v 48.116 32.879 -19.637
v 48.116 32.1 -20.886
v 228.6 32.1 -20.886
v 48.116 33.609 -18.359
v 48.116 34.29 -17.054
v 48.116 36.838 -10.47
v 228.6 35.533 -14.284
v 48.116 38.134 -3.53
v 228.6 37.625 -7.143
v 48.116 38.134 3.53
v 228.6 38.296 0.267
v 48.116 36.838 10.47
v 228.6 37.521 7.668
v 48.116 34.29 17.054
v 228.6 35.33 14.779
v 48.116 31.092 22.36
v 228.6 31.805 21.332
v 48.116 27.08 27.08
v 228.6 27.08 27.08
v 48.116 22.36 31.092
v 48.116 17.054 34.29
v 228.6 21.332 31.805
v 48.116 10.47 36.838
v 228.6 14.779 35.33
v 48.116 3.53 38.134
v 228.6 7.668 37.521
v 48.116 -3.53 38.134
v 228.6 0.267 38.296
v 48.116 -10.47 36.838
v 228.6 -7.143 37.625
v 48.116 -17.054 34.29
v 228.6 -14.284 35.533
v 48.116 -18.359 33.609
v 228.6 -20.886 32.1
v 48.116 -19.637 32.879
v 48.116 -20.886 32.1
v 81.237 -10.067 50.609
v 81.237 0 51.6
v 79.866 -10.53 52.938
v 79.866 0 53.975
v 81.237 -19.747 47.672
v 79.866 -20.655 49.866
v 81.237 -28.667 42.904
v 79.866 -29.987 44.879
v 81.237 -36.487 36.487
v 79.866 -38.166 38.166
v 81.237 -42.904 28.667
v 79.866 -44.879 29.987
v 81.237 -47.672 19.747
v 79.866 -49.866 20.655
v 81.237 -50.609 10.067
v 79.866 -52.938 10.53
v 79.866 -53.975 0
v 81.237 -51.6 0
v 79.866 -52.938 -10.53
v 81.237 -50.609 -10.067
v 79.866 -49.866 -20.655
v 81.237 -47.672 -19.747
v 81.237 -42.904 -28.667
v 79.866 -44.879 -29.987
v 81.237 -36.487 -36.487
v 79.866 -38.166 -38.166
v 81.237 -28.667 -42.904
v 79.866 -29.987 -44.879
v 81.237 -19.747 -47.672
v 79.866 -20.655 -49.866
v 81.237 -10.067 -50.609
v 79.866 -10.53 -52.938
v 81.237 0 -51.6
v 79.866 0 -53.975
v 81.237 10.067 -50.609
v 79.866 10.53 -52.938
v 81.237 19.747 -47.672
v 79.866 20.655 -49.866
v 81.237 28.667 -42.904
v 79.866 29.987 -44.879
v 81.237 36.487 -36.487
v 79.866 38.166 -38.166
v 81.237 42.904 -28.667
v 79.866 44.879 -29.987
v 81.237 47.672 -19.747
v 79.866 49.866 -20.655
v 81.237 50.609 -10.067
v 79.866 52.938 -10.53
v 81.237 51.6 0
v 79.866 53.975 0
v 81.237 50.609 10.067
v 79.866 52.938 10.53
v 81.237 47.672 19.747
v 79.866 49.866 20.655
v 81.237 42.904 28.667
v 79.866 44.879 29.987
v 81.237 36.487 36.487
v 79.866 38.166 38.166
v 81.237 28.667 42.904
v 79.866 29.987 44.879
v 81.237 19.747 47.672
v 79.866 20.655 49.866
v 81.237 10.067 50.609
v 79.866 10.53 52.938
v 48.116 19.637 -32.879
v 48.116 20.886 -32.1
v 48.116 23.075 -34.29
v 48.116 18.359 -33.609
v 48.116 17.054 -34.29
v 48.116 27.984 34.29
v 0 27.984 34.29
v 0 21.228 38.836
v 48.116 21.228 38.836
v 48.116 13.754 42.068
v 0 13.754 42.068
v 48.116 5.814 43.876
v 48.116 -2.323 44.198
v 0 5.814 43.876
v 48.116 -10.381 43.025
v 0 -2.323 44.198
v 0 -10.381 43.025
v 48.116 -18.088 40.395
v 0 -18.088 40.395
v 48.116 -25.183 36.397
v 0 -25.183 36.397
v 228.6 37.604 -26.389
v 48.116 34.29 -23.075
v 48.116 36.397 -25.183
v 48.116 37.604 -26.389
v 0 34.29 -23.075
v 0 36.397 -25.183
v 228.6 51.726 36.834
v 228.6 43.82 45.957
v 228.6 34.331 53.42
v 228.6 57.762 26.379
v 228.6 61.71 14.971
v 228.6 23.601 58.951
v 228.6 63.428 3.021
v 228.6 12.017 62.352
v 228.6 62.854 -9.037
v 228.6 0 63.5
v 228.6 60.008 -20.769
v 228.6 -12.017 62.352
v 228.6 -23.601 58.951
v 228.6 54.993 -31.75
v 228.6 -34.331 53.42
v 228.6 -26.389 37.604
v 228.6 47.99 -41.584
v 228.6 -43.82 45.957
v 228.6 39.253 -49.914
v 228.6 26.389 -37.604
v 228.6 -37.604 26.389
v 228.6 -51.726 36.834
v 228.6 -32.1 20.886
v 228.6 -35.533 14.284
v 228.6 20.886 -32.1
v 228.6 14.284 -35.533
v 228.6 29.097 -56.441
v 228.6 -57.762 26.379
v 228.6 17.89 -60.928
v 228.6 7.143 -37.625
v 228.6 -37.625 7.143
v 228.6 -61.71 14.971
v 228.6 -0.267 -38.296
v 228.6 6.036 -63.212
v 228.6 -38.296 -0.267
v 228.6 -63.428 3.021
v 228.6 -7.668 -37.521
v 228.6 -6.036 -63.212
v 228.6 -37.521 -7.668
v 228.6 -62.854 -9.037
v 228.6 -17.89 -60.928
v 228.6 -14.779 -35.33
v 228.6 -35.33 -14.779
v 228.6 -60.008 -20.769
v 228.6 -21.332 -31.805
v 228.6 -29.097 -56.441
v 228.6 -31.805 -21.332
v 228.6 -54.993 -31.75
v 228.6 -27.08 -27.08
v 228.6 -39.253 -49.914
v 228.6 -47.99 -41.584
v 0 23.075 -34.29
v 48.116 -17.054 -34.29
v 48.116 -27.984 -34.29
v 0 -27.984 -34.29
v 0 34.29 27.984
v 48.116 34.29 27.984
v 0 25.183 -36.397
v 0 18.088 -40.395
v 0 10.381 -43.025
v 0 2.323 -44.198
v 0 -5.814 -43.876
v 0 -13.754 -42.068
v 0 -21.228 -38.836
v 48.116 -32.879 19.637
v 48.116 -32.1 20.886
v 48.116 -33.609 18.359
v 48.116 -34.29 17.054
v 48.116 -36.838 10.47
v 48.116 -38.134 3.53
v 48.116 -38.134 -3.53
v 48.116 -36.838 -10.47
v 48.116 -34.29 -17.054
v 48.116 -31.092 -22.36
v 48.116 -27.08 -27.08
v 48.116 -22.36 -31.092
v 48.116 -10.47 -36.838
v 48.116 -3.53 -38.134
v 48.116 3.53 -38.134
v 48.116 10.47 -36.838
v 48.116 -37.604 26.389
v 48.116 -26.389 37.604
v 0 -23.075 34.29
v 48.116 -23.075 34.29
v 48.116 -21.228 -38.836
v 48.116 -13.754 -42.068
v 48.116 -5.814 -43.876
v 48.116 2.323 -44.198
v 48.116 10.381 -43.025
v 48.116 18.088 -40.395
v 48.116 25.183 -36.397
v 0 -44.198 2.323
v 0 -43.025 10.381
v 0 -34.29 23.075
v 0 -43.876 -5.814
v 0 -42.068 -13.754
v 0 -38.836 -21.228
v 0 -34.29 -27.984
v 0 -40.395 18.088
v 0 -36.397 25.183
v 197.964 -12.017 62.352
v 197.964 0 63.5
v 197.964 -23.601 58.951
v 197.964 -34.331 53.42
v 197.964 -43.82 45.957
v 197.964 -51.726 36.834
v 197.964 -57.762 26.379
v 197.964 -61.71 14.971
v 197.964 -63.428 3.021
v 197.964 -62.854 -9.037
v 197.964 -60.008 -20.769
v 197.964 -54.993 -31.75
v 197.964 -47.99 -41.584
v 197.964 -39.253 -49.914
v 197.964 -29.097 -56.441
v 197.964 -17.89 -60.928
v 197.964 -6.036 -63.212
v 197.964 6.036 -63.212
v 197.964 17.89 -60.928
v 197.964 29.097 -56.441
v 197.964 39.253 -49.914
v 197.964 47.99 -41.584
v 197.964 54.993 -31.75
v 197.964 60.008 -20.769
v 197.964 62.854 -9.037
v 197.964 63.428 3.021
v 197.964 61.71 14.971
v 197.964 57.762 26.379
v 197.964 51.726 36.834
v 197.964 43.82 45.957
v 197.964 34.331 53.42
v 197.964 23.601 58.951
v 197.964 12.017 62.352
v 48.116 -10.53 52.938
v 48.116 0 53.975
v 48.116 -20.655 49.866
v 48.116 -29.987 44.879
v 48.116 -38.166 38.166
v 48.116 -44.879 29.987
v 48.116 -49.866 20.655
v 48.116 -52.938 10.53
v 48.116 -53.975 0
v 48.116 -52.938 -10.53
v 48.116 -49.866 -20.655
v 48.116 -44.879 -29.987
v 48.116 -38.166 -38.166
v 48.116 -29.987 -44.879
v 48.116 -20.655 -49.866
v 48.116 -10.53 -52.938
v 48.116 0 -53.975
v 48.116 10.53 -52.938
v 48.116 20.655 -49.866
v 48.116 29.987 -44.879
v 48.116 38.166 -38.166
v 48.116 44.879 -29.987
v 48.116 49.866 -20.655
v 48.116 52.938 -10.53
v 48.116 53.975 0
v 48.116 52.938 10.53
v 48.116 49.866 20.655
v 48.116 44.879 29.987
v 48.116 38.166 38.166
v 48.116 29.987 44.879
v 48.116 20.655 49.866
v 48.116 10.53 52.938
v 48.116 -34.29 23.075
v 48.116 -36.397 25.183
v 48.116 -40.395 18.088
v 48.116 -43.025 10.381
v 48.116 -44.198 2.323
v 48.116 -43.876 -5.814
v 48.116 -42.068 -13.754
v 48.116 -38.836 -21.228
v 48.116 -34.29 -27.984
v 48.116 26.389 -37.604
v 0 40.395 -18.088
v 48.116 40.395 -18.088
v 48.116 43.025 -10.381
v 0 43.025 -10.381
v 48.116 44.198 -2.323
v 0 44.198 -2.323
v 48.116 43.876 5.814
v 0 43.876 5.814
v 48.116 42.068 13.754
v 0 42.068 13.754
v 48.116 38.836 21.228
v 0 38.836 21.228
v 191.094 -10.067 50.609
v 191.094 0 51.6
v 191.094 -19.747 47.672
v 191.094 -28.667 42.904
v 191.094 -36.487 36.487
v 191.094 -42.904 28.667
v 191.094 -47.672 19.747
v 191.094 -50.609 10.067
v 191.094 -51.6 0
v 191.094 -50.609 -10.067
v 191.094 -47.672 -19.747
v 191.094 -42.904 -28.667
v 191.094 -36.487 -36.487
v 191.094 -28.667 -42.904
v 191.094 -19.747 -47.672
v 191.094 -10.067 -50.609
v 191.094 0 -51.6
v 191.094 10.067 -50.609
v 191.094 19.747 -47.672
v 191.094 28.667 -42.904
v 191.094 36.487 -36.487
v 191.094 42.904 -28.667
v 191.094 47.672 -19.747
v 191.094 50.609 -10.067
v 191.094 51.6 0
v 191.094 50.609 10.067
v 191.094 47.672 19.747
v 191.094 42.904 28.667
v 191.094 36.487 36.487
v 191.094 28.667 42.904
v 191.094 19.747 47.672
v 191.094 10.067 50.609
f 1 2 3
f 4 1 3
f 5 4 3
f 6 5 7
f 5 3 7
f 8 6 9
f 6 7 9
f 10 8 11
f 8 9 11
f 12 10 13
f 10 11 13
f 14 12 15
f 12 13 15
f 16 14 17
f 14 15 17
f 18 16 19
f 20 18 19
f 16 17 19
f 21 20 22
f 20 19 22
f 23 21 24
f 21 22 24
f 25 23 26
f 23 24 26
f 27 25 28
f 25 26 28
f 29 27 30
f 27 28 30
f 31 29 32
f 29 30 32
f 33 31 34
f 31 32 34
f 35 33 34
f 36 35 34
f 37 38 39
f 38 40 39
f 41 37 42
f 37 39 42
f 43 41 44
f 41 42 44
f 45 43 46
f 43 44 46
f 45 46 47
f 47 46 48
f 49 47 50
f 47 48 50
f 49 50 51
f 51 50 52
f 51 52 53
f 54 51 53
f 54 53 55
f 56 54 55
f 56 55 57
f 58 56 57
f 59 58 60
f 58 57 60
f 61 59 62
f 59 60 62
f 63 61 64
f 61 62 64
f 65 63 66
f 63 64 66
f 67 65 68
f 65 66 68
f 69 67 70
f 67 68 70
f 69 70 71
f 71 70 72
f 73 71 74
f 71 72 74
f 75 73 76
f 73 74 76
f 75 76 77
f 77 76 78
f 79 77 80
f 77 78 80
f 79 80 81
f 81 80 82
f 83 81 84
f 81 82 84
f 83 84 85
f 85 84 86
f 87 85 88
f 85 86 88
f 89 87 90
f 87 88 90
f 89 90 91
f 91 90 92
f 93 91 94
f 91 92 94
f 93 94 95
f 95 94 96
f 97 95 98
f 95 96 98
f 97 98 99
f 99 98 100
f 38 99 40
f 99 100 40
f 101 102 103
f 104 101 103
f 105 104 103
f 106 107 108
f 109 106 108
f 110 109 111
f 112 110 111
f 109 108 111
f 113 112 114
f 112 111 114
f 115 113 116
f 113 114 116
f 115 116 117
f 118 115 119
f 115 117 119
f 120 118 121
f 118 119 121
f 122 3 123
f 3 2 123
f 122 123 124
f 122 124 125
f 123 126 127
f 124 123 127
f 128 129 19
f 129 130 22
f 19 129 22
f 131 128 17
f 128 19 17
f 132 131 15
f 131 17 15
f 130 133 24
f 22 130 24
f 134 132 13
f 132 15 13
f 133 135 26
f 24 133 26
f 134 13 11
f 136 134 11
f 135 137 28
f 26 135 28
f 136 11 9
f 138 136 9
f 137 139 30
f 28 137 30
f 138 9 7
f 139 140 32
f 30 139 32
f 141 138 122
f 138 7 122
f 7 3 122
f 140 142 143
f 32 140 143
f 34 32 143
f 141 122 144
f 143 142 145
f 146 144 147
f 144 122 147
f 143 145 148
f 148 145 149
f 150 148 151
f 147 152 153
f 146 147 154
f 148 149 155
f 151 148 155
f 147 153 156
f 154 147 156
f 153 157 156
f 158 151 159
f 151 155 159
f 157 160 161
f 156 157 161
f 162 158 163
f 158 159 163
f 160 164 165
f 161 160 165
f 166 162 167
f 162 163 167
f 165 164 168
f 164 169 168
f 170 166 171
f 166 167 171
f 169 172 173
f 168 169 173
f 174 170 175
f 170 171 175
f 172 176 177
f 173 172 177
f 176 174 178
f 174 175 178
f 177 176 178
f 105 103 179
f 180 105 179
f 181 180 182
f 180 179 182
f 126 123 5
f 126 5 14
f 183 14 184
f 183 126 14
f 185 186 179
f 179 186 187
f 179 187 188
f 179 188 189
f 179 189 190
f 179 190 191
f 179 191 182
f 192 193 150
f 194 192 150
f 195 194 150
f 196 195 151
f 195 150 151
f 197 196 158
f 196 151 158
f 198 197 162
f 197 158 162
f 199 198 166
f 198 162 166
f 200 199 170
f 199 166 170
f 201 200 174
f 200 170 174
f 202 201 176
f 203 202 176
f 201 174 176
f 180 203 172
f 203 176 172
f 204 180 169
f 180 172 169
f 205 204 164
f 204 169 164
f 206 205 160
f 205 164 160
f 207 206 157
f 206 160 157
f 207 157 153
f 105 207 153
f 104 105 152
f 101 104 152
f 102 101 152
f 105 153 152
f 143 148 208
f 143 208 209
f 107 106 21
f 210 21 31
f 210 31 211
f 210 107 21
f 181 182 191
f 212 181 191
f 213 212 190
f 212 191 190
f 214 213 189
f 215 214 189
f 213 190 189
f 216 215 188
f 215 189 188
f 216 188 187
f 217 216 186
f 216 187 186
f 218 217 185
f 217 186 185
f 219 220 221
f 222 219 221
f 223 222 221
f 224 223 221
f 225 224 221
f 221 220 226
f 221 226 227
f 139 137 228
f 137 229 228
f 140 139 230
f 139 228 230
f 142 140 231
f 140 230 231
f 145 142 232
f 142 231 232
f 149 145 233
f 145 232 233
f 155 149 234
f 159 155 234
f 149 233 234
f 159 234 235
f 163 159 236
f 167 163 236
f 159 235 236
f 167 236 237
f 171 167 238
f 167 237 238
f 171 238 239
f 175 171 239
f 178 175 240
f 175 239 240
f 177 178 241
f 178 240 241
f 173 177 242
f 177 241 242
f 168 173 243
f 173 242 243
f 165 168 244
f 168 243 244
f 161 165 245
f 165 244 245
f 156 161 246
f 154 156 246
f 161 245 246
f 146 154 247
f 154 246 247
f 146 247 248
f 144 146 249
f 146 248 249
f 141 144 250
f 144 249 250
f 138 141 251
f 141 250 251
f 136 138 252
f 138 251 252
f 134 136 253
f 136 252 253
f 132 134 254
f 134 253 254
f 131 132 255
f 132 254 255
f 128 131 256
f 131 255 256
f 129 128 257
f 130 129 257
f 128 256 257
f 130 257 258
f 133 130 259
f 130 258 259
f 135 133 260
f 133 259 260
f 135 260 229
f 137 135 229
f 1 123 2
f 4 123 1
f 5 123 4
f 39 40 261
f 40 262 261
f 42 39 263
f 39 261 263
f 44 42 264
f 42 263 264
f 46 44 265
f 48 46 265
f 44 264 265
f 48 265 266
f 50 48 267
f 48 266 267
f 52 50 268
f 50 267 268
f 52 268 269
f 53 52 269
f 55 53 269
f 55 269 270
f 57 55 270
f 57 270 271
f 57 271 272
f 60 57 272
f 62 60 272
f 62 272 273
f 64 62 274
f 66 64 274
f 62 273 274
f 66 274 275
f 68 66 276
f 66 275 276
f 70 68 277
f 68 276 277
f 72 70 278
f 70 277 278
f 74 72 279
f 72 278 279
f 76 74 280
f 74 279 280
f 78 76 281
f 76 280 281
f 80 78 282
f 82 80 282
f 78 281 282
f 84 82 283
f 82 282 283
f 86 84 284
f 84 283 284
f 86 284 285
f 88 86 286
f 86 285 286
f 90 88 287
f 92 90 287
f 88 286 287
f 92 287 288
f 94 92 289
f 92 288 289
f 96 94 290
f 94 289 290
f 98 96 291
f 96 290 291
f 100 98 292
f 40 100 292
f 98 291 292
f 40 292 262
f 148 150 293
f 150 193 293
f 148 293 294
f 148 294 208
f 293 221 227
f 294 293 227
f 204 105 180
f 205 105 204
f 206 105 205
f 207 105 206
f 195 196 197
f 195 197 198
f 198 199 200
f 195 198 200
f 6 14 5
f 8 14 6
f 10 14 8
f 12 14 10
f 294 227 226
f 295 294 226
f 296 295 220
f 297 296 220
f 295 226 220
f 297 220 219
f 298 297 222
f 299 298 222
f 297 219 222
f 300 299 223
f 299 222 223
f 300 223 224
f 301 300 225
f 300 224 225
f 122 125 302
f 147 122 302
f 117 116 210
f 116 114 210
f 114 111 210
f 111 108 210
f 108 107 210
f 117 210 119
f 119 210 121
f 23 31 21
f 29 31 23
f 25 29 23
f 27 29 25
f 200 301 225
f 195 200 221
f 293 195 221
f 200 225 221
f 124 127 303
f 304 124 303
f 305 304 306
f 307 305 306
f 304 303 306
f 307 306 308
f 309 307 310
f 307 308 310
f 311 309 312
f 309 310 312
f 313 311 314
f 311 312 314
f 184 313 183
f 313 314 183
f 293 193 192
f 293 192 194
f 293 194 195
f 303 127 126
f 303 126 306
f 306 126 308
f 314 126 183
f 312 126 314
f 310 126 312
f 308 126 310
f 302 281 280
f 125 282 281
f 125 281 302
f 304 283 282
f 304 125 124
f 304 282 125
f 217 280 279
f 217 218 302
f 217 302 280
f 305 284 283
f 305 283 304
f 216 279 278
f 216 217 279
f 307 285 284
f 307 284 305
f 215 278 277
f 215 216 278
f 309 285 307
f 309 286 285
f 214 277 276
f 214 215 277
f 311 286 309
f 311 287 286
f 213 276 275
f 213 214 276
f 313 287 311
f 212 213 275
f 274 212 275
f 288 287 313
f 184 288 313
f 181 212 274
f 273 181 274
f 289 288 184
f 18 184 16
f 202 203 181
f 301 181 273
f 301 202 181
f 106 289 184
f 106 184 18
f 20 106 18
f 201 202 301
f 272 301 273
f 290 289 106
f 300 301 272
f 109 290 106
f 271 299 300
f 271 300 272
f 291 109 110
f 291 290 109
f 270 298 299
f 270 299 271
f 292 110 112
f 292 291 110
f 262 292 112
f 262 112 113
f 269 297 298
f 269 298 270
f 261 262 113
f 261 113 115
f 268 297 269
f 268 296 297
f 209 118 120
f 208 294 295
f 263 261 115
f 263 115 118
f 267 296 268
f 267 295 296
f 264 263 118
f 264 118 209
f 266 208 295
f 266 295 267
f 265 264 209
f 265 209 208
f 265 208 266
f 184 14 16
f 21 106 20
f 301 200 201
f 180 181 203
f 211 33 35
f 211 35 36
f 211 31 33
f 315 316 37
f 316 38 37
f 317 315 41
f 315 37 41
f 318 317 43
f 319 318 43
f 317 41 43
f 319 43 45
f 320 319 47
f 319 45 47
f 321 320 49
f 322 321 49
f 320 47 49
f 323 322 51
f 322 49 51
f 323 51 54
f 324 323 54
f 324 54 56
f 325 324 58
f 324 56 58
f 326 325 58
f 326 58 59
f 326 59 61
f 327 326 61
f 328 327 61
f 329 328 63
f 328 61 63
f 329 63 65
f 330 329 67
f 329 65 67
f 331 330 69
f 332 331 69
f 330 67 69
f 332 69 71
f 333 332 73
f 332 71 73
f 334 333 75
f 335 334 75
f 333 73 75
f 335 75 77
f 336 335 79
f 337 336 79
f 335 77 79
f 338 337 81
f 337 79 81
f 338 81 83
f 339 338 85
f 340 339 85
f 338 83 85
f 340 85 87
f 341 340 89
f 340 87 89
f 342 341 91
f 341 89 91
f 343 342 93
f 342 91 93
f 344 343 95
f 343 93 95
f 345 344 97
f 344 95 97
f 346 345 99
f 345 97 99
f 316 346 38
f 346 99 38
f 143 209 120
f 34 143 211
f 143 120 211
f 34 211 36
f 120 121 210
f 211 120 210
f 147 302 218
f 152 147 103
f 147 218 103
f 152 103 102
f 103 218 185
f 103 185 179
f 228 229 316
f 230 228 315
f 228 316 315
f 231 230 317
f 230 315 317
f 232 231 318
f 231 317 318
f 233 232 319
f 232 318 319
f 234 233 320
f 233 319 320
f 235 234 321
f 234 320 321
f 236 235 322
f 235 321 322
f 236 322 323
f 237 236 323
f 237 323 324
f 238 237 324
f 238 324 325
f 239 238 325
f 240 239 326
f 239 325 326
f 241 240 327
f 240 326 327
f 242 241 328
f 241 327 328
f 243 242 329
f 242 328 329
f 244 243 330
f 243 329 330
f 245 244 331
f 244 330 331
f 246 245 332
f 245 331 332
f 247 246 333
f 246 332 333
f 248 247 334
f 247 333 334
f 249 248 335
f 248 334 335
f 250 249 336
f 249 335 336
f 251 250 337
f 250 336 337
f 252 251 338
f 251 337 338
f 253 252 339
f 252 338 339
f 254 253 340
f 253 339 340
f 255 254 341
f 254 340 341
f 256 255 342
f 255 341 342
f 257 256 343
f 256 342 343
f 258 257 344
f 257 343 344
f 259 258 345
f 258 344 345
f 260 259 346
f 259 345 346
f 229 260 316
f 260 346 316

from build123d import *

# Parameters (mm, degrees)
F3_W     = 68.58
F3_H     = 68.58
F4_DEPTH = 48.1161598
F7_DEPTH = 203.2


with BuildPart() as f1:
    # F0 (on Front) → F1 (revolve)
    with BuildSketch(Plane.XZ):
        Polygon((228.6, 38.29685), (228.6, 63.5), (197.9639424, 63.5), (191.0935472, 51.6001), (81.237328, 51.6001), (79.8661598, 53.975), (48.1161598, 53.975), (48.1161598, 44.2595), (48.1161598, 38.29685), align=None)
        Polygon((48.1161598, 34.29), (48.1161598, 38.29685), (48.1161598, 44.2595), (0, 44.2595), (0, 34.29), align=None)
    revolve(axis=Axis((114.3, 0, 0), (1, 0, 0)))

    # F3 (on offset) → F4 (cut, through all)
    with BuildSketch(Plane(origin=(0, 0, 0), x_dir=(0, -1, 0), z_dir=(-1, 0, 0))):
        Rectangle(F3_W, F3_H)
    extrude(amount=-F4_DEPTH, mode=Mode.SUBTRACT)

    # F6 (on offset) → F7 (cut, symmetric)
    with BuildSketch(Plane(origin=(48.1161598, 0, 0), x_dir=(0, -1, 0), z_dir=(-1, 0, 0))):
        Polygon((-5.607271922, 5.607271922), (0, 0), (31.9966525594, 31.9966525594), (26.3893806374, 37.6039244814), align=None)
        Polygon((5.607271922, -5.607271922), (0, 0), (-5.607271922, 5.607271922), (-37.6039244814, -26.3893806374), (-26.3893806374, -37.6039244814), align=None)
        Polygon((31.9966525594, 31.9966525594), (0, 0), (5.607271922, -5.607271922), (37.6039244814, 26.3893806374), align=None)
    extrude(amount=F7_DEPTH, both=True, mode=Mode.SUBTRACT)


solid = f1.part
